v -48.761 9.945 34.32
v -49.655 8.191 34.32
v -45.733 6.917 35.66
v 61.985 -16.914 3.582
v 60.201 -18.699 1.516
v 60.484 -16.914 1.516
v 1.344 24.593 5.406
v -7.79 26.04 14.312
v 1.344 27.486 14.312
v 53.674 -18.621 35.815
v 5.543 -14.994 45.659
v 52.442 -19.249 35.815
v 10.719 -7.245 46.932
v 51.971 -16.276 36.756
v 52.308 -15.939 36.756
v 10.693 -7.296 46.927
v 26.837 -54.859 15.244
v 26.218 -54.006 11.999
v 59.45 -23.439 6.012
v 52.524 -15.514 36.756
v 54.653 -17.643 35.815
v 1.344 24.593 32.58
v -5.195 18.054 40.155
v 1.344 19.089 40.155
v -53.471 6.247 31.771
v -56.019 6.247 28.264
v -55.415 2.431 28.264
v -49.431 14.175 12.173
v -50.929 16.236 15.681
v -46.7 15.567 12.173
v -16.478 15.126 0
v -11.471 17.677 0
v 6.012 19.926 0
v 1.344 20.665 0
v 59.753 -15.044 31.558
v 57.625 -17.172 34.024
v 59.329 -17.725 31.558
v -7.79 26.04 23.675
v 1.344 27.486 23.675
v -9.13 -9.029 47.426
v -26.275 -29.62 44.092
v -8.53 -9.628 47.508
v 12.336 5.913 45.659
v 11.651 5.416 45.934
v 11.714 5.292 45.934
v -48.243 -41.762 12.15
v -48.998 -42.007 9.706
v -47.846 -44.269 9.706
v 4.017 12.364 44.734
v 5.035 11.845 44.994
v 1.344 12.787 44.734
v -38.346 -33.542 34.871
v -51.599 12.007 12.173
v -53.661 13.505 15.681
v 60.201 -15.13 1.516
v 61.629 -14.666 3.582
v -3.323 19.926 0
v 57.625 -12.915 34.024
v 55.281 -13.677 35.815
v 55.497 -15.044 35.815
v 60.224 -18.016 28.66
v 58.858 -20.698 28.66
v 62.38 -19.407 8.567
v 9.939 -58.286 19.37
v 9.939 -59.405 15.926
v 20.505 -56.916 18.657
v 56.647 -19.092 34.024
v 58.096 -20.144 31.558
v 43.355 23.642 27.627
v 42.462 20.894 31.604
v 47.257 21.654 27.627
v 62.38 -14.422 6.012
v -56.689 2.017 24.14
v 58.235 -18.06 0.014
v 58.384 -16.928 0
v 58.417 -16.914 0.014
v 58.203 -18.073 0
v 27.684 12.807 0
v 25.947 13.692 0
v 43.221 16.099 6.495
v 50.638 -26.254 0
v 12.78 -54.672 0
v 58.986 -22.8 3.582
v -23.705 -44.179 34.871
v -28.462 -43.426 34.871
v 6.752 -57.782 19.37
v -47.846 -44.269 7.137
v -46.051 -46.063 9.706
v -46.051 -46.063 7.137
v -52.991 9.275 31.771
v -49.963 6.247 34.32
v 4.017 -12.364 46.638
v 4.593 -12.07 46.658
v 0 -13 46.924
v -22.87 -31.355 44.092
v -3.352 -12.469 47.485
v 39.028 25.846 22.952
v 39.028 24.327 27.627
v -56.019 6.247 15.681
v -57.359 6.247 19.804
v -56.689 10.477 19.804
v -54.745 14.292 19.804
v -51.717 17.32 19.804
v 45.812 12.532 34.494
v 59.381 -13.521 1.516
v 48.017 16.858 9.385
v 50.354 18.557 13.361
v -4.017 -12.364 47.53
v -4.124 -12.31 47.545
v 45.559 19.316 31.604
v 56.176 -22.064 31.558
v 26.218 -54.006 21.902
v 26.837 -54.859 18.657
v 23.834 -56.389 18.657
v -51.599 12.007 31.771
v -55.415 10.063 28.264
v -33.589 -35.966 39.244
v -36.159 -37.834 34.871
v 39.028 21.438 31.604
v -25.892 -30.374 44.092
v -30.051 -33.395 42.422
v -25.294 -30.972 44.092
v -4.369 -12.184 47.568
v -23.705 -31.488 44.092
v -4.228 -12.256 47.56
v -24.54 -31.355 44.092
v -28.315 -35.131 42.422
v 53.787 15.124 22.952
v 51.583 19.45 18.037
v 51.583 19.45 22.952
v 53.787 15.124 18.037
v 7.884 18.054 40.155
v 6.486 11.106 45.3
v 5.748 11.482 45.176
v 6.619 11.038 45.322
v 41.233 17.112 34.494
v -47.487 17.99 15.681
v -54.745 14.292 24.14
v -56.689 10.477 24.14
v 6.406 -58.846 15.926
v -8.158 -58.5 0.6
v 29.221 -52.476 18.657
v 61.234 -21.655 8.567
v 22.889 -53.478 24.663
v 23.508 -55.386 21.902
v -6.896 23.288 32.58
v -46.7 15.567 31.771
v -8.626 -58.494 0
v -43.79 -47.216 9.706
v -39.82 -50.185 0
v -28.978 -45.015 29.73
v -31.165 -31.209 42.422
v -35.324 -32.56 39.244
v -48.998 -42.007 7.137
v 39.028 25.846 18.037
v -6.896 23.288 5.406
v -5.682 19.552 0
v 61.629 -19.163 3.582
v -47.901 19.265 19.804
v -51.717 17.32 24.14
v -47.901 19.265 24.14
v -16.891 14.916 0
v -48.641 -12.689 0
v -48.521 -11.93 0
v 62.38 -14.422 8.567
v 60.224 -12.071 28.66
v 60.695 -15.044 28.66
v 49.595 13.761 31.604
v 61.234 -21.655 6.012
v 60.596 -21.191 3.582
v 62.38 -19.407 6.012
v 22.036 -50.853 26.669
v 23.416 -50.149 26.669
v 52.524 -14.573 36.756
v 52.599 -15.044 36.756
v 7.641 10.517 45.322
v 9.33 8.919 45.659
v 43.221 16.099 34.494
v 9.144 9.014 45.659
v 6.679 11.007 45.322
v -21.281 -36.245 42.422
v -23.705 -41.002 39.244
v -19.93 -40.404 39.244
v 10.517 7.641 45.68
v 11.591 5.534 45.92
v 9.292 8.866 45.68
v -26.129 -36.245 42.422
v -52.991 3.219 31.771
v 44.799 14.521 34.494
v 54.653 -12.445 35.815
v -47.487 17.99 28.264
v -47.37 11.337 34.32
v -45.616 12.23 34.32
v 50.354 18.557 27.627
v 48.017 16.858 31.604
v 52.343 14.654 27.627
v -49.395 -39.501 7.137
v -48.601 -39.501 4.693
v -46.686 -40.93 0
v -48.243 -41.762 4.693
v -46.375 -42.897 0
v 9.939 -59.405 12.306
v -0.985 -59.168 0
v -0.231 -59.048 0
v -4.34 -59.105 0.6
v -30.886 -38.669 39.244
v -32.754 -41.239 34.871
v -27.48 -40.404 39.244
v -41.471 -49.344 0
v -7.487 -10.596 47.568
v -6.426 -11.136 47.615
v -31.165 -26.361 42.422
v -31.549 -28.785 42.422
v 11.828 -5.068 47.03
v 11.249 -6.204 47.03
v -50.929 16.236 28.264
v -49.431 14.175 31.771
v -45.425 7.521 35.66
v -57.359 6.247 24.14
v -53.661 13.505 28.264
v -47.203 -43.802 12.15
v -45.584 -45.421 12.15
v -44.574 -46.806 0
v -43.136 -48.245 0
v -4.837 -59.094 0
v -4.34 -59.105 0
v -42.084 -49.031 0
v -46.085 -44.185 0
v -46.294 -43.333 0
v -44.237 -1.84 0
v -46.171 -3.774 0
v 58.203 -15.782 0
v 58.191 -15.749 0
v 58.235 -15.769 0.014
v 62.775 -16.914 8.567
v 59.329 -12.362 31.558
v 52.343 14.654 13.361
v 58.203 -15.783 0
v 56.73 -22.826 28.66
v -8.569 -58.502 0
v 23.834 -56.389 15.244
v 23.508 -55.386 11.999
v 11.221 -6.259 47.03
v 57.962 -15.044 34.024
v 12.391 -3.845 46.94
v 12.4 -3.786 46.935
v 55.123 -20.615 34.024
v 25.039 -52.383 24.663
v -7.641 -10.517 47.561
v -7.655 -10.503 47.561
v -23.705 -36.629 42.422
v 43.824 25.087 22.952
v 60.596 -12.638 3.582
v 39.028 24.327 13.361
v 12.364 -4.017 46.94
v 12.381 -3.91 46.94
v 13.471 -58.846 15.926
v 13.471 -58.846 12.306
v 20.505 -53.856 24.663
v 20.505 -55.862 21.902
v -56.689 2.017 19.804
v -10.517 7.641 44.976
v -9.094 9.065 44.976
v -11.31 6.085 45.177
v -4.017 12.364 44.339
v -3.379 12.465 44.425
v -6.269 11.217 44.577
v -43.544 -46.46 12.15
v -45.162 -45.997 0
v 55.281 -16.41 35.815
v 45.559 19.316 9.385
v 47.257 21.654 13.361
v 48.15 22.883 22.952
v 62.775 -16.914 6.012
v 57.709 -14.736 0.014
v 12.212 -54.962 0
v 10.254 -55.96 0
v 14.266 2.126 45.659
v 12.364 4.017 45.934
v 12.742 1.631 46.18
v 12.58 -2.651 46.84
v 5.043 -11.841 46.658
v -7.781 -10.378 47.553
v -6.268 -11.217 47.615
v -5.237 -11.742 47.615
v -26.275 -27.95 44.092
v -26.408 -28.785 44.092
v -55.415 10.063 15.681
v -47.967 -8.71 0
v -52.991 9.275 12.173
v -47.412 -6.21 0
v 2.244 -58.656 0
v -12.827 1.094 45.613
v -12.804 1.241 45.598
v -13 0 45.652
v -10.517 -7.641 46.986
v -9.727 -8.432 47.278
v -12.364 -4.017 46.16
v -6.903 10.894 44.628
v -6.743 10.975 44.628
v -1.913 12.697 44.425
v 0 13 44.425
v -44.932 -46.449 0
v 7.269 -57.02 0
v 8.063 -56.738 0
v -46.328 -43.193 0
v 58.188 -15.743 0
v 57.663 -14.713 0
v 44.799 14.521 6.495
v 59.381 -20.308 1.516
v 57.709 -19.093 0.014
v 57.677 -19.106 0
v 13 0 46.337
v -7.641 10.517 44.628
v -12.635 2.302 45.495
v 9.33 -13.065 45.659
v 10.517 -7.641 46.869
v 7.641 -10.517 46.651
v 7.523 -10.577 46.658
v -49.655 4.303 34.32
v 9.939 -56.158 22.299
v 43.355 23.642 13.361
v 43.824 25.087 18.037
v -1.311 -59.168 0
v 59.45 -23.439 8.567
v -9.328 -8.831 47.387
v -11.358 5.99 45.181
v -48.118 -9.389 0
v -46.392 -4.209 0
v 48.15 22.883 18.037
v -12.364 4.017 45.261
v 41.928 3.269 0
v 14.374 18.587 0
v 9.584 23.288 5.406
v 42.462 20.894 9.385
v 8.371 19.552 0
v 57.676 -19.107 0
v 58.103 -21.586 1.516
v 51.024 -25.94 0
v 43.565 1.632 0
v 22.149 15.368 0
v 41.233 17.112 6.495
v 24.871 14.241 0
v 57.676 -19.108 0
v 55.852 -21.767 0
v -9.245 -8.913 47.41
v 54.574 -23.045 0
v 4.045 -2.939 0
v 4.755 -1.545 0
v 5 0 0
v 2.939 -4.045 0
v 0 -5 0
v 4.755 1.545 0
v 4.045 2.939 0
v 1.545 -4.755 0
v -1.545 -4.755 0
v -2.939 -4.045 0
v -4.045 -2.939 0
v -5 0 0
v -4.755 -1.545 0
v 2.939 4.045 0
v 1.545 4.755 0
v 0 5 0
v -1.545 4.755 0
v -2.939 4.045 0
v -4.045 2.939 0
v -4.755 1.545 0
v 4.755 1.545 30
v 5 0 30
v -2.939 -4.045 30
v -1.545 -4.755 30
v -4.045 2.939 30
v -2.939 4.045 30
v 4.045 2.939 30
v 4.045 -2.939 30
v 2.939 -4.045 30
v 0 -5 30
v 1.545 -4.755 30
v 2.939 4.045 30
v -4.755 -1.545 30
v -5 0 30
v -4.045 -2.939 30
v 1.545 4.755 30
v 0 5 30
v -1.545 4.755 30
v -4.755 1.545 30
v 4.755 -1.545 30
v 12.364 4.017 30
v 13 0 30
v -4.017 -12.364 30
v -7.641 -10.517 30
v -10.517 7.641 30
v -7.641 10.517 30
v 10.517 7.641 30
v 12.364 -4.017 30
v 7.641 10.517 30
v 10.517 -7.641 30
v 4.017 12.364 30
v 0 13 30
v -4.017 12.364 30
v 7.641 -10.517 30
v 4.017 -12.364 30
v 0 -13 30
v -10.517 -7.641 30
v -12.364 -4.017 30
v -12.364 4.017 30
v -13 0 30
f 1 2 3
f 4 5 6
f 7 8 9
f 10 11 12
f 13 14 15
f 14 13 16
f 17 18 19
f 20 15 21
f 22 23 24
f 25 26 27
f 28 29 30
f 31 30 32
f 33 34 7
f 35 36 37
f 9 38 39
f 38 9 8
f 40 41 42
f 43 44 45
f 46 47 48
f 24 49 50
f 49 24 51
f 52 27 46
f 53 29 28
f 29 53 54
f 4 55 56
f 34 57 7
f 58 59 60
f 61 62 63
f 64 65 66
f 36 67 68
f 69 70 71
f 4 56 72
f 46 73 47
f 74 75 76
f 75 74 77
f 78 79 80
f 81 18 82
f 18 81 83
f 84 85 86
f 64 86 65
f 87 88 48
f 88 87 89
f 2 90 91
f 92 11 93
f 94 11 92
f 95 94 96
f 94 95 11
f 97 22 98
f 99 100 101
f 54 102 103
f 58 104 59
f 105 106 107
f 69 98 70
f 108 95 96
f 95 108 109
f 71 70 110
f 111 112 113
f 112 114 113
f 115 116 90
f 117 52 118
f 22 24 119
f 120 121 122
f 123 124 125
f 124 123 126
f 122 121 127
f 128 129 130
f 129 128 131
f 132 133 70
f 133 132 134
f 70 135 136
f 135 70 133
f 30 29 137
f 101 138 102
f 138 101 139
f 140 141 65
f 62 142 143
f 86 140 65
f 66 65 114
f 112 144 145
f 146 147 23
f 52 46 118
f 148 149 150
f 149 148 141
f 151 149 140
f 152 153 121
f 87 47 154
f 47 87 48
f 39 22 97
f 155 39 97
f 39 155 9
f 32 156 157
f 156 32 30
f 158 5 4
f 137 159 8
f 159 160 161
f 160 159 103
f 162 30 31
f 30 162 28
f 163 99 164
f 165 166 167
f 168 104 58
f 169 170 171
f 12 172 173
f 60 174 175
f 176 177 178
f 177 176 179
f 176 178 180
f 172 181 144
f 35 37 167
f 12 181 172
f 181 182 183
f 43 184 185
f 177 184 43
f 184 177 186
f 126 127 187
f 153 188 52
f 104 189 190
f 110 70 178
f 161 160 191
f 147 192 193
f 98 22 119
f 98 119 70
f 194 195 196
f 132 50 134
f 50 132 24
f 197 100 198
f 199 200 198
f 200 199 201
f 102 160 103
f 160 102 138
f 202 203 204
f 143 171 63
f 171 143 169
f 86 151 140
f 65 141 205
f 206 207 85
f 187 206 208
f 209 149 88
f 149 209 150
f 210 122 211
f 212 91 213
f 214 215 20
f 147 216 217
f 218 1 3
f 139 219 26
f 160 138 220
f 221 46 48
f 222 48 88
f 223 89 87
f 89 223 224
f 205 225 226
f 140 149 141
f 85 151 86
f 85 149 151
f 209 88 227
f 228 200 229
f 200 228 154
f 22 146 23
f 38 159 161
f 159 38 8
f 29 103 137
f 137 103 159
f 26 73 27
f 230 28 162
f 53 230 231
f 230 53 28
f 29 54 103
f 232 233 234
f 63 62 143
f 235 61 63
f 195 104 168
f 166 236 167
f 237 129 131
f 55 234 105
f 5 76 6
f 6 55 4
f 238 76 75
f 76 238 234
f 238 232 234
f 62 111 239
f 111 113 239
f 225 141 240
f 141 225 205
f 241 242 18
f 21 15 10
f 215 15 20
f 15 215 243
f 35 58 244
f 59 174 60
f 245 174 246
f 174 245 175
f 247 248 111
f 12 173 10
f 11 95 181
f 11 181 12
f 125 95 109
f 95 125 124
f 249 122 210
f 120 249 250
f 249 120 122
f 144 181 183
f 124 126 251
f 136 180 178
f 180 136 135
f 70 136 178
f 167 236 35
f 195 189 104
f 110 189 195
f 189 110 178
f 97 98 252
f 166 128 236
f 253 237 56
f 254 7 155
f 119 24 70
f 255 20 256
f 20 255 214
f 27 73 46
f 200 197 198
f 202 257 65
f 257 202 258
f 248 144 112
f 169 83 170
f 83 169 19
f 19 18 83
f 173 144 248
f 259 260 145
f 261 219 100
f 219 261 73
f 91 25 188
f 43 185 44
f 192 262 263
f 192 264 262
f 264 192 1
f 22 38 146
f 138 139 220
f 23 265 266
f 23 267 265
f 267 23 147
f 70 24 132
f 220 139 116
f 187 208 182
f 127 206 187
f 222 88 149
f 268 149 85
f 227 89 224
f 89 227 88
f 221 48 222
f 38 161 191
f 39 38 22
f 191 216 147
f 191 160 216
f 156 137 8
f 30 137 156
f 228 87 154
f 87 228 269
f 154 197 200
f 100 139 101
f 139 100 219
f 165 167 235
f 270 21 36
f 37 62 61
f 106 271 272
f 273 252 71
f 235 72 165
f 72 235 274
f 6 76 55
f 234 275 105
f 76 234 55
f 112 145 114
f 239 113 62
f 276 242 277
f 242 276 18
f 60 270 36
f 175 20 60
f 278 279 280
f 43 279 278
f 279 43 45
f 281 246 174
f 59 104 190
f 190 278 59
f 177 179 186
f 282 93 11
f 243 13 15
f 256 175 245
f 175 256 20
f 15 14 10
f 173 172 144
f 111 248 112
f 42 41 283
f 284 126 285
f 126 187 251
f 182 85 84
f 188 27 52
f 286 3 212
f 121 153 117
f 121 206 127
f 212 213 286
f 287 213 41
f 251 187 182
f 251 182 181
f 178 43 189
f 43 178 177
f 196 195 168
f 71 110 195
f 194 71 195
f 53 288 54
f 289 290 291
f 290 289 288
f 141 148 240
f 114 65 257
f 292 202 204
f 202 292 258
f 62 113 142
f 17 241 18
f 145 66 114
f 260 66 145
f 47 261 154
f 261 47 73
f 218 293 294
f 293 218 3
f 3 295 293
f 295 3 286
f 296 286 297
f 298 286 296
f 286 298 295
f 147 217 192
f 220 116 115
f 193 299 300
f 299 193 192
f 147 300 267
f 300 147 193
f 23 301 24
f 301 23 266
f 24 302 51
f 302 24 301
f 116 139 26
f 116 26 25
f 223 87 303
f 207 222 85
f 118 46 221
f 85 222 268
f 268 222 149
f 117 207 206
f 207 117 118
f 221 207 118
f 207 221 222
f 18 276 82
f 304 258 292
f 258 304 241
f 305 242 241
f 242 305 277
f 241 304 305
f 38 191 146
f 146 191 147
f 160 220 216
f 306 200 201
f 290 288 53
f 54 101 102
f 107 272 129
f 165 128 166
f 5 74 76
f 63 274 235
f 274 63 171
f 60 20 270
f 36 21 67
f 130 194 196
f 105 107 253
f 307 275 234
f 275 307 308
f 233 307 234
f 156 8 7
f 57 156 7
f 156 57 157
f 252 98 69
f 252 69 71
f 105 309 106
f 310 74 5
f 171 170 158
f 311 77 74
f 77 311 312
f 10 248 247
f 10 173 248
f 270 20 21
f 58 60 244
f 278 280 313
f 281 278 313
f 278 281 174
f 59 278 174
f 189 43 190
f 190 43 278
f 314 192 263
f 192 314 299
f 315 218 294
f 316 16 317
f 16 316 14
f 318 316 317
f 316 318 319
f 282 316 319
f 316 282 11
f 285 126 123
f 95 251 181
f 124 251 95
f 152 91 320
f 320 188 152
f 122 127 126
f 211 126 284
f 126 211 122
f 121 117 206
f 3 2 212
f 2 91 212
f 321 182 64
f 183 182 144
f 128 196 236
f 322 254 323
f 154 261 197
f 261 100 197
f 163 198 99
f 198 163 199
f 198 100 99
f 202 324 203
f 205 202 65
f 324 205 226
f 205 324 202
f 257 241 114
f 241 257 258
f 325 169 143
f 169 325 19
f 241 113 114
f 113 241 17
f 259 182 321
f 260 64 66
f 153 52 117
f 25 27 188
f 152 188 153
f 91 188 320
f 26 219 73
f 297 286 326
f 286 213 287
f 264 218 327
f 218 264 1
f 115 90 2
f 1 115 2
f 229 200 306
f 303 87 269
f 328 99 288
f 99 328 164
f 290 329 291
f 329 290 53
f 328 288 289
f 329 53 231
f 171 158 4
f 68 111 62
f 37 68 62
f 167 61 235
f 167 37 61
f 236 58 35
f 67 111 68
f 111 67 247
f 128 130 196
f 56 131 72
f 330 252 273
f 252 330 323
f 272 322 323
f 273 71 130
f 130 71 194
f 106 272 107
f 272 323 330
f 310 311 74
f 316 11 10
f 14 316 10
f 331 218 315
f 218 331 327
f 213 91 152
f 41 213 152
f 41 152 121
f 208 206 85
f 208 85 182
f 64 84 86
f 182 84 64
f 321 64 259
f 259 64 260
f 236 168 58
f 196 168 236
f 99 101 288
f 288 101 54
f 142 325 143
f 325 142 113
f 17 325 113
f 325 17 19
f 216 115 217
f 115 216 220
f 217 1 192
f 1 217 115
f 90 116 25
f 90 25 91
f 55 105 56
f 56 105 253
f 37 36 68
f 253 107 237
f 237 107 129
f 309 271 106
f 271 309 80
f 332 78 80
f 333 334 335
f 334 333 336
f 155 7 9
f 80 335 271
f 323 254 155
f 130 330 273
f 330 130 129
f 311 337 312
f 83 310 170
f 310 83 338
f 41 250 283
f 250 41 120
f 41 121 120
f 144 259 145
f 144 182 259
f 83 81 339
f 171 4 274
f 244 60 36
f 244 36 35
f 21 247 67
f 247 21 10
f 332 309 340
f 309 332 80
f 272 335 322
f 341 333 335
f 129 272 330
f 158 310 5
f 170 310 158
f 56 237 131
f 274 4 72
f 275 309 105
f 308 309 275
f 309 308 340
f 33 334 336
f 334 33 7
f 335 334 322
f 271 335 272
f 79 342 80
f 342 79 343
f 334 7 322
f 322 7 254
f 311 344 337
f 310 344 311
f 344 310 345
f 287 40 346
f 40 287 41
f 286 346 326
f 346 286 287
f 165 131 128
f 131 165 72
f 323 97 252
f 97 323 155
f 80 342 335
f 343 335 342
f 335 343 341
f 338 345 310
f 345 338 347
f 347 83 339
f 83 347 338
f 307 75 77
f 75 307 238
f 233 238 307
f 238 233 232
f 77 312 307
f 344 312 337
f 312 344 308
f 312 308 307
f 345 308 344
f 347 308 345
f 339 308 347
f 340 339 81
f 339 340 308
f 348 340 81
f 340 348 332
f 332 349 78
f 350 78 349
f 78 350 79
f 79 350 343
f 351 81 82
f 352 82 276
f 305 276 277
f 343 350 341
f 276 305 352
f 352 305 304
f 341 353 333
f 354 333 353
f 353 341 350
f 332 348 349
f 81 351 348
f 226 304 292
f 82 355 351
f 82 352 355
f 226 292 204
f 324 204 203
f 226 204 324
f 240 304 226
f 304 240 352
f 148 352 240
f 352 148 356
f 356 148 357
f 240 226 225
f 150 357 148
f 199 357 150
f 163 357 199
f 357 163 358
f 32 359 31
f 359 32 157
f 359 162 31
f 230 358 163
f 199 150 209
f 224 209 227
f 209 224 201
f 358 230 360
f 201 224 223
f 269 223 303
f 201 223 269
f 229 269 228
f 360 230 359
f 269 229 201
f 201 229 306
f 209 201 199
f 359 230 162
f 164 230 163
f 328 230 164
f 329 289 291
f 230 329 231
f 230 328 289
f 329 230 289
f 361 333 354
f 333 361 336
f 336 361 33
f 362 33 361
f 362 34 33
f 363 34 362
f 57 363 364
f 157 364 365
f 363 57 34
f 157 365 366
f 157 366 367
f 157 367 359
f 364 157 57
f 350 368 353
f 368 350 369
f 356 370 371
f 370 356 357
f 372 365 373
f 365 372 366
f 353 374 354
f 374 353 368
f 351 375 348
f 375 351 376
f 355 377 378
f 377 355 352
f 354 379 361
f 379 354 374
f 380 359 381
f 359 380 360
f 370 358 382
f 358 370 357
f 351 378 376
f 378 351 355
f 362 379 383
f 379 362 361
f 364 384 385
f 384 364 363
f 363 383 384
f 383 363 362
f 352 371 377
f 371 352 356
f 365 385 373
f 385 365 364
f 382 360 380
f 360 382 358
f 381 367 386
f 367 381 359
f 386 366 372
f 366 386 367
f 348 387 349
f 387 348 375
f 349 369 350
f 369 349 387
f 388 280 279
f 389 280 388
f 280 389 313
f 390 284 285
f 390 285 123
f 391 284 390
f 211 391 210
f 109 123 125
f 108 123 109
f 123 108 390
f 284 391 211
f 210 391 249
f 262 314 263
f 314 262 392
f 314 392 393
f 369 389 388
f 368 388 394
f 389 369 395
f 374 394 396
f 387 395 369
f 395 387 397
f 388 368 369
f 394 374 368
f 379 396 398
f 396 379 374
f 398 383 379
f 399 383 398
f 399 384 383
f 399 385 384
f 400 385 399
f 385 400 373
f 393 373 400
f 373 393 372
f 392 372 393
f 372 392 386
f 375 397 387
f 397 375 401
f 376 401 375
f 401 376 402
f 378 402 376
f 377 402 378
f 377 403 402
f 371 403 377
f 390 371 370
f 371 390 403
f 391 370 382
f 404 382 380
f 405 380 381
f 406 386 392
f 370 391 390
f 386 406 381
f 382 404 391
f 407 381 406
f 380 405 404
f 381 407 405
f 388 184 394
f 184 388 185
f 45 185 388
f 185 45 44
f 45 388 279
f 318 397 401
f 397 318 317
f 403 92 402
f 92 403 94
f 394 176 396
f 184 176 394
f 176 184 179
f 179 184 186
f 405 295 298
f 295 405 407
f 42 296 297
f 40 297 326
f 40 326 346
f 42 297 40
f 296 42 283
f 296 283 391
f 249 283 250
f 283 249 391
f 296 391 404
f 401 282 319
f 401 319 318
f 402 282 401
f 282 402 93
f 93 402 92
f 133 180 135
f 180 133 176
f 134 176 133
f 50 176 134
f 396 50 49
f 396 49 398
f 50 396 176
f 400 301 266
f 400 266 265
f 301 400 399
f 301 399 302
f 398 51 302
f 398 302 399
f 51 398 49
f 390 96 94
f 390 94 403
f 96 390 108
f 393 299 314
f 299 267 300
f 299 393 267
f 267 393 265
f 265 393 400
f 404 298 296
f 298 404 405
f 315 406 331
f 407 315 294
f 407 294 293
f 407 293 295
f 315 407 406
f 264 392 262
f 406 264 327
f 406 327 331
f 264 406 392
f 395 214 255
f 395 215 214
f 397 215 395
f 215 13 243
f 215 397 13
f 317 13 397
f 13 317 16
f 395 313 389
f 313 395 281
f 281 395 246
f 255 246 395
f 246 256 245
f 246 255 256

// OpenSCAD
//Customizable Rock Climbing Hold v1.2
//v1 had 125 views and 11 downloads
//v1.1 had 16 views and 4 downloads
//Created by Ari M. Diacou, October 2014
//Shared under Creative Commons License: Attribution-ShareAlike 3.0 Unported (CC BY-SA 3.0) 
//see http://creativecommons.org/licenses/by-sa/3.0/

// preview[view:north west, tilt:top diagonal]

//Maximum(ish) size of hold in mm
Dmax=120;
//Changes hold thickness based on climb difficulty
difficulty=5.7;//[5.4,5.5,5.6,5.7,5.8,5.9,"5.10"]
//A way to save your random arrangement
seed=20;
//Diameter of the socket wrench you will tighten your bolt with in mm
head_diameter=26;
//Diameter of the hole that the bolt will fit into in mm
bore_diameter=10;
//number of spheres
n=12;
//Parameter for scaling of element sizes (smaller makes spikier rocks)
a=7;//[1:10]
//Changes curviness of rocks ($fn= 4 or 20) and adds an uncut reference rock
testing_mode=false;

                 /*[Hidden]*/

///////////////// Variables ///////////////////////
Rmax=Dmax/2;
vector=rands(0,1,3*n,seed);
//Figures how thin to make the hold based on the desired difficulty of the route
z_adjustment = (difficulty=="5.10" || difficulty-5.1<.04) ? 
	-0.4 :
	(difficulty-5.7)*(-4/3);
//Use lower resolution in testing mode for speed
$fn= testing_mode ? 4 : 20;

///////////////////Main()/////////////////////////
hold(vector);

//A bunch of other testing/debugging options
if(testing_mode){
	//Reference copy, uncomment to see whole rock
	translate([3*Rmax,0,0]) rock(vector);
	translate([3*Rmax,0,0]) show_space();
	echo(str("For difficulty of ",difficulty," the z adjustment is: ",z_adjustment));
	}

/////////////////Functions///////////////////////
module hold(vector_of_n_random_triplets){
	difference(){
		translate([0,0,Rmax*z_adjustment])
			rock(vector_of_n_random_triplets);
		//Remove the bottom to give a flat base
		translate([0,0,-Rmax*1.5]) 
			cube(Rmax*3,center=true);
		//Drill a hole for the bolt
		cylinder(r=bore_diameter/2,h=4*Rmax,center=true,$fn=20);
		//Counter-sink for the bolt head
		translate([0,0,Rmax*(0.5+z_adjustment)]) //0.68 is an average because I cant 
			if(testing_mode){
				#cylinder(r=head_diameter/2,h=Rmax,$fn=20);}
			else{
				cylinder(r=head_diameter/2,h=Rmax,$fn=20);}
		}
	}

module rock(vector_of_n_random_triplets){
	v=vector_of_n_random_triplets;
	hull(){
		for(i=[0:n-1]){ //For each i, pass a triplet to module element()
			element([v[i],v[i+1],v[i+2]]);
			}
		}
	}

module element(v){
	//Sets up a sphere of radius R randomly placed in a cylinder
	//a triplet of random [0,1] numbers are converted to a cylindrical triplet
	//the cylinder has a radius of Rmax, and a height of Rmax

	//Coordinates of a sphere in cylindrical coordinates
	r=Rmax*v[0]; 
	theta=360*v[1]; 
	z=(v[2]-0.5)*Rmax;
	//But OpenSCAD thinks in cartesian
	y=r*sin(theta);
	x=r*cos(theta);
	/*We have to wrap/hull() all of these spheres to make a rock. To make it aesthetically convincing, spheres at the edges of the allowed range should be smaller than those placed towards the center. I chose a gaussian distribution of sphere radius as a function of r/Rmax, which is simply v[0]. */
	R=.5*Rmax*exp(-v[0]*v[0]/(a/10));
	translate([x,y,z]) sphere(R);
	}

module show_space(){ 
	//makes a transparent highlighted cylinder spanning the space that
	//element()s can be placed in.
	%# cylinder(2*Rmax,r=Rmax,center=true, $fn=40);
	}
